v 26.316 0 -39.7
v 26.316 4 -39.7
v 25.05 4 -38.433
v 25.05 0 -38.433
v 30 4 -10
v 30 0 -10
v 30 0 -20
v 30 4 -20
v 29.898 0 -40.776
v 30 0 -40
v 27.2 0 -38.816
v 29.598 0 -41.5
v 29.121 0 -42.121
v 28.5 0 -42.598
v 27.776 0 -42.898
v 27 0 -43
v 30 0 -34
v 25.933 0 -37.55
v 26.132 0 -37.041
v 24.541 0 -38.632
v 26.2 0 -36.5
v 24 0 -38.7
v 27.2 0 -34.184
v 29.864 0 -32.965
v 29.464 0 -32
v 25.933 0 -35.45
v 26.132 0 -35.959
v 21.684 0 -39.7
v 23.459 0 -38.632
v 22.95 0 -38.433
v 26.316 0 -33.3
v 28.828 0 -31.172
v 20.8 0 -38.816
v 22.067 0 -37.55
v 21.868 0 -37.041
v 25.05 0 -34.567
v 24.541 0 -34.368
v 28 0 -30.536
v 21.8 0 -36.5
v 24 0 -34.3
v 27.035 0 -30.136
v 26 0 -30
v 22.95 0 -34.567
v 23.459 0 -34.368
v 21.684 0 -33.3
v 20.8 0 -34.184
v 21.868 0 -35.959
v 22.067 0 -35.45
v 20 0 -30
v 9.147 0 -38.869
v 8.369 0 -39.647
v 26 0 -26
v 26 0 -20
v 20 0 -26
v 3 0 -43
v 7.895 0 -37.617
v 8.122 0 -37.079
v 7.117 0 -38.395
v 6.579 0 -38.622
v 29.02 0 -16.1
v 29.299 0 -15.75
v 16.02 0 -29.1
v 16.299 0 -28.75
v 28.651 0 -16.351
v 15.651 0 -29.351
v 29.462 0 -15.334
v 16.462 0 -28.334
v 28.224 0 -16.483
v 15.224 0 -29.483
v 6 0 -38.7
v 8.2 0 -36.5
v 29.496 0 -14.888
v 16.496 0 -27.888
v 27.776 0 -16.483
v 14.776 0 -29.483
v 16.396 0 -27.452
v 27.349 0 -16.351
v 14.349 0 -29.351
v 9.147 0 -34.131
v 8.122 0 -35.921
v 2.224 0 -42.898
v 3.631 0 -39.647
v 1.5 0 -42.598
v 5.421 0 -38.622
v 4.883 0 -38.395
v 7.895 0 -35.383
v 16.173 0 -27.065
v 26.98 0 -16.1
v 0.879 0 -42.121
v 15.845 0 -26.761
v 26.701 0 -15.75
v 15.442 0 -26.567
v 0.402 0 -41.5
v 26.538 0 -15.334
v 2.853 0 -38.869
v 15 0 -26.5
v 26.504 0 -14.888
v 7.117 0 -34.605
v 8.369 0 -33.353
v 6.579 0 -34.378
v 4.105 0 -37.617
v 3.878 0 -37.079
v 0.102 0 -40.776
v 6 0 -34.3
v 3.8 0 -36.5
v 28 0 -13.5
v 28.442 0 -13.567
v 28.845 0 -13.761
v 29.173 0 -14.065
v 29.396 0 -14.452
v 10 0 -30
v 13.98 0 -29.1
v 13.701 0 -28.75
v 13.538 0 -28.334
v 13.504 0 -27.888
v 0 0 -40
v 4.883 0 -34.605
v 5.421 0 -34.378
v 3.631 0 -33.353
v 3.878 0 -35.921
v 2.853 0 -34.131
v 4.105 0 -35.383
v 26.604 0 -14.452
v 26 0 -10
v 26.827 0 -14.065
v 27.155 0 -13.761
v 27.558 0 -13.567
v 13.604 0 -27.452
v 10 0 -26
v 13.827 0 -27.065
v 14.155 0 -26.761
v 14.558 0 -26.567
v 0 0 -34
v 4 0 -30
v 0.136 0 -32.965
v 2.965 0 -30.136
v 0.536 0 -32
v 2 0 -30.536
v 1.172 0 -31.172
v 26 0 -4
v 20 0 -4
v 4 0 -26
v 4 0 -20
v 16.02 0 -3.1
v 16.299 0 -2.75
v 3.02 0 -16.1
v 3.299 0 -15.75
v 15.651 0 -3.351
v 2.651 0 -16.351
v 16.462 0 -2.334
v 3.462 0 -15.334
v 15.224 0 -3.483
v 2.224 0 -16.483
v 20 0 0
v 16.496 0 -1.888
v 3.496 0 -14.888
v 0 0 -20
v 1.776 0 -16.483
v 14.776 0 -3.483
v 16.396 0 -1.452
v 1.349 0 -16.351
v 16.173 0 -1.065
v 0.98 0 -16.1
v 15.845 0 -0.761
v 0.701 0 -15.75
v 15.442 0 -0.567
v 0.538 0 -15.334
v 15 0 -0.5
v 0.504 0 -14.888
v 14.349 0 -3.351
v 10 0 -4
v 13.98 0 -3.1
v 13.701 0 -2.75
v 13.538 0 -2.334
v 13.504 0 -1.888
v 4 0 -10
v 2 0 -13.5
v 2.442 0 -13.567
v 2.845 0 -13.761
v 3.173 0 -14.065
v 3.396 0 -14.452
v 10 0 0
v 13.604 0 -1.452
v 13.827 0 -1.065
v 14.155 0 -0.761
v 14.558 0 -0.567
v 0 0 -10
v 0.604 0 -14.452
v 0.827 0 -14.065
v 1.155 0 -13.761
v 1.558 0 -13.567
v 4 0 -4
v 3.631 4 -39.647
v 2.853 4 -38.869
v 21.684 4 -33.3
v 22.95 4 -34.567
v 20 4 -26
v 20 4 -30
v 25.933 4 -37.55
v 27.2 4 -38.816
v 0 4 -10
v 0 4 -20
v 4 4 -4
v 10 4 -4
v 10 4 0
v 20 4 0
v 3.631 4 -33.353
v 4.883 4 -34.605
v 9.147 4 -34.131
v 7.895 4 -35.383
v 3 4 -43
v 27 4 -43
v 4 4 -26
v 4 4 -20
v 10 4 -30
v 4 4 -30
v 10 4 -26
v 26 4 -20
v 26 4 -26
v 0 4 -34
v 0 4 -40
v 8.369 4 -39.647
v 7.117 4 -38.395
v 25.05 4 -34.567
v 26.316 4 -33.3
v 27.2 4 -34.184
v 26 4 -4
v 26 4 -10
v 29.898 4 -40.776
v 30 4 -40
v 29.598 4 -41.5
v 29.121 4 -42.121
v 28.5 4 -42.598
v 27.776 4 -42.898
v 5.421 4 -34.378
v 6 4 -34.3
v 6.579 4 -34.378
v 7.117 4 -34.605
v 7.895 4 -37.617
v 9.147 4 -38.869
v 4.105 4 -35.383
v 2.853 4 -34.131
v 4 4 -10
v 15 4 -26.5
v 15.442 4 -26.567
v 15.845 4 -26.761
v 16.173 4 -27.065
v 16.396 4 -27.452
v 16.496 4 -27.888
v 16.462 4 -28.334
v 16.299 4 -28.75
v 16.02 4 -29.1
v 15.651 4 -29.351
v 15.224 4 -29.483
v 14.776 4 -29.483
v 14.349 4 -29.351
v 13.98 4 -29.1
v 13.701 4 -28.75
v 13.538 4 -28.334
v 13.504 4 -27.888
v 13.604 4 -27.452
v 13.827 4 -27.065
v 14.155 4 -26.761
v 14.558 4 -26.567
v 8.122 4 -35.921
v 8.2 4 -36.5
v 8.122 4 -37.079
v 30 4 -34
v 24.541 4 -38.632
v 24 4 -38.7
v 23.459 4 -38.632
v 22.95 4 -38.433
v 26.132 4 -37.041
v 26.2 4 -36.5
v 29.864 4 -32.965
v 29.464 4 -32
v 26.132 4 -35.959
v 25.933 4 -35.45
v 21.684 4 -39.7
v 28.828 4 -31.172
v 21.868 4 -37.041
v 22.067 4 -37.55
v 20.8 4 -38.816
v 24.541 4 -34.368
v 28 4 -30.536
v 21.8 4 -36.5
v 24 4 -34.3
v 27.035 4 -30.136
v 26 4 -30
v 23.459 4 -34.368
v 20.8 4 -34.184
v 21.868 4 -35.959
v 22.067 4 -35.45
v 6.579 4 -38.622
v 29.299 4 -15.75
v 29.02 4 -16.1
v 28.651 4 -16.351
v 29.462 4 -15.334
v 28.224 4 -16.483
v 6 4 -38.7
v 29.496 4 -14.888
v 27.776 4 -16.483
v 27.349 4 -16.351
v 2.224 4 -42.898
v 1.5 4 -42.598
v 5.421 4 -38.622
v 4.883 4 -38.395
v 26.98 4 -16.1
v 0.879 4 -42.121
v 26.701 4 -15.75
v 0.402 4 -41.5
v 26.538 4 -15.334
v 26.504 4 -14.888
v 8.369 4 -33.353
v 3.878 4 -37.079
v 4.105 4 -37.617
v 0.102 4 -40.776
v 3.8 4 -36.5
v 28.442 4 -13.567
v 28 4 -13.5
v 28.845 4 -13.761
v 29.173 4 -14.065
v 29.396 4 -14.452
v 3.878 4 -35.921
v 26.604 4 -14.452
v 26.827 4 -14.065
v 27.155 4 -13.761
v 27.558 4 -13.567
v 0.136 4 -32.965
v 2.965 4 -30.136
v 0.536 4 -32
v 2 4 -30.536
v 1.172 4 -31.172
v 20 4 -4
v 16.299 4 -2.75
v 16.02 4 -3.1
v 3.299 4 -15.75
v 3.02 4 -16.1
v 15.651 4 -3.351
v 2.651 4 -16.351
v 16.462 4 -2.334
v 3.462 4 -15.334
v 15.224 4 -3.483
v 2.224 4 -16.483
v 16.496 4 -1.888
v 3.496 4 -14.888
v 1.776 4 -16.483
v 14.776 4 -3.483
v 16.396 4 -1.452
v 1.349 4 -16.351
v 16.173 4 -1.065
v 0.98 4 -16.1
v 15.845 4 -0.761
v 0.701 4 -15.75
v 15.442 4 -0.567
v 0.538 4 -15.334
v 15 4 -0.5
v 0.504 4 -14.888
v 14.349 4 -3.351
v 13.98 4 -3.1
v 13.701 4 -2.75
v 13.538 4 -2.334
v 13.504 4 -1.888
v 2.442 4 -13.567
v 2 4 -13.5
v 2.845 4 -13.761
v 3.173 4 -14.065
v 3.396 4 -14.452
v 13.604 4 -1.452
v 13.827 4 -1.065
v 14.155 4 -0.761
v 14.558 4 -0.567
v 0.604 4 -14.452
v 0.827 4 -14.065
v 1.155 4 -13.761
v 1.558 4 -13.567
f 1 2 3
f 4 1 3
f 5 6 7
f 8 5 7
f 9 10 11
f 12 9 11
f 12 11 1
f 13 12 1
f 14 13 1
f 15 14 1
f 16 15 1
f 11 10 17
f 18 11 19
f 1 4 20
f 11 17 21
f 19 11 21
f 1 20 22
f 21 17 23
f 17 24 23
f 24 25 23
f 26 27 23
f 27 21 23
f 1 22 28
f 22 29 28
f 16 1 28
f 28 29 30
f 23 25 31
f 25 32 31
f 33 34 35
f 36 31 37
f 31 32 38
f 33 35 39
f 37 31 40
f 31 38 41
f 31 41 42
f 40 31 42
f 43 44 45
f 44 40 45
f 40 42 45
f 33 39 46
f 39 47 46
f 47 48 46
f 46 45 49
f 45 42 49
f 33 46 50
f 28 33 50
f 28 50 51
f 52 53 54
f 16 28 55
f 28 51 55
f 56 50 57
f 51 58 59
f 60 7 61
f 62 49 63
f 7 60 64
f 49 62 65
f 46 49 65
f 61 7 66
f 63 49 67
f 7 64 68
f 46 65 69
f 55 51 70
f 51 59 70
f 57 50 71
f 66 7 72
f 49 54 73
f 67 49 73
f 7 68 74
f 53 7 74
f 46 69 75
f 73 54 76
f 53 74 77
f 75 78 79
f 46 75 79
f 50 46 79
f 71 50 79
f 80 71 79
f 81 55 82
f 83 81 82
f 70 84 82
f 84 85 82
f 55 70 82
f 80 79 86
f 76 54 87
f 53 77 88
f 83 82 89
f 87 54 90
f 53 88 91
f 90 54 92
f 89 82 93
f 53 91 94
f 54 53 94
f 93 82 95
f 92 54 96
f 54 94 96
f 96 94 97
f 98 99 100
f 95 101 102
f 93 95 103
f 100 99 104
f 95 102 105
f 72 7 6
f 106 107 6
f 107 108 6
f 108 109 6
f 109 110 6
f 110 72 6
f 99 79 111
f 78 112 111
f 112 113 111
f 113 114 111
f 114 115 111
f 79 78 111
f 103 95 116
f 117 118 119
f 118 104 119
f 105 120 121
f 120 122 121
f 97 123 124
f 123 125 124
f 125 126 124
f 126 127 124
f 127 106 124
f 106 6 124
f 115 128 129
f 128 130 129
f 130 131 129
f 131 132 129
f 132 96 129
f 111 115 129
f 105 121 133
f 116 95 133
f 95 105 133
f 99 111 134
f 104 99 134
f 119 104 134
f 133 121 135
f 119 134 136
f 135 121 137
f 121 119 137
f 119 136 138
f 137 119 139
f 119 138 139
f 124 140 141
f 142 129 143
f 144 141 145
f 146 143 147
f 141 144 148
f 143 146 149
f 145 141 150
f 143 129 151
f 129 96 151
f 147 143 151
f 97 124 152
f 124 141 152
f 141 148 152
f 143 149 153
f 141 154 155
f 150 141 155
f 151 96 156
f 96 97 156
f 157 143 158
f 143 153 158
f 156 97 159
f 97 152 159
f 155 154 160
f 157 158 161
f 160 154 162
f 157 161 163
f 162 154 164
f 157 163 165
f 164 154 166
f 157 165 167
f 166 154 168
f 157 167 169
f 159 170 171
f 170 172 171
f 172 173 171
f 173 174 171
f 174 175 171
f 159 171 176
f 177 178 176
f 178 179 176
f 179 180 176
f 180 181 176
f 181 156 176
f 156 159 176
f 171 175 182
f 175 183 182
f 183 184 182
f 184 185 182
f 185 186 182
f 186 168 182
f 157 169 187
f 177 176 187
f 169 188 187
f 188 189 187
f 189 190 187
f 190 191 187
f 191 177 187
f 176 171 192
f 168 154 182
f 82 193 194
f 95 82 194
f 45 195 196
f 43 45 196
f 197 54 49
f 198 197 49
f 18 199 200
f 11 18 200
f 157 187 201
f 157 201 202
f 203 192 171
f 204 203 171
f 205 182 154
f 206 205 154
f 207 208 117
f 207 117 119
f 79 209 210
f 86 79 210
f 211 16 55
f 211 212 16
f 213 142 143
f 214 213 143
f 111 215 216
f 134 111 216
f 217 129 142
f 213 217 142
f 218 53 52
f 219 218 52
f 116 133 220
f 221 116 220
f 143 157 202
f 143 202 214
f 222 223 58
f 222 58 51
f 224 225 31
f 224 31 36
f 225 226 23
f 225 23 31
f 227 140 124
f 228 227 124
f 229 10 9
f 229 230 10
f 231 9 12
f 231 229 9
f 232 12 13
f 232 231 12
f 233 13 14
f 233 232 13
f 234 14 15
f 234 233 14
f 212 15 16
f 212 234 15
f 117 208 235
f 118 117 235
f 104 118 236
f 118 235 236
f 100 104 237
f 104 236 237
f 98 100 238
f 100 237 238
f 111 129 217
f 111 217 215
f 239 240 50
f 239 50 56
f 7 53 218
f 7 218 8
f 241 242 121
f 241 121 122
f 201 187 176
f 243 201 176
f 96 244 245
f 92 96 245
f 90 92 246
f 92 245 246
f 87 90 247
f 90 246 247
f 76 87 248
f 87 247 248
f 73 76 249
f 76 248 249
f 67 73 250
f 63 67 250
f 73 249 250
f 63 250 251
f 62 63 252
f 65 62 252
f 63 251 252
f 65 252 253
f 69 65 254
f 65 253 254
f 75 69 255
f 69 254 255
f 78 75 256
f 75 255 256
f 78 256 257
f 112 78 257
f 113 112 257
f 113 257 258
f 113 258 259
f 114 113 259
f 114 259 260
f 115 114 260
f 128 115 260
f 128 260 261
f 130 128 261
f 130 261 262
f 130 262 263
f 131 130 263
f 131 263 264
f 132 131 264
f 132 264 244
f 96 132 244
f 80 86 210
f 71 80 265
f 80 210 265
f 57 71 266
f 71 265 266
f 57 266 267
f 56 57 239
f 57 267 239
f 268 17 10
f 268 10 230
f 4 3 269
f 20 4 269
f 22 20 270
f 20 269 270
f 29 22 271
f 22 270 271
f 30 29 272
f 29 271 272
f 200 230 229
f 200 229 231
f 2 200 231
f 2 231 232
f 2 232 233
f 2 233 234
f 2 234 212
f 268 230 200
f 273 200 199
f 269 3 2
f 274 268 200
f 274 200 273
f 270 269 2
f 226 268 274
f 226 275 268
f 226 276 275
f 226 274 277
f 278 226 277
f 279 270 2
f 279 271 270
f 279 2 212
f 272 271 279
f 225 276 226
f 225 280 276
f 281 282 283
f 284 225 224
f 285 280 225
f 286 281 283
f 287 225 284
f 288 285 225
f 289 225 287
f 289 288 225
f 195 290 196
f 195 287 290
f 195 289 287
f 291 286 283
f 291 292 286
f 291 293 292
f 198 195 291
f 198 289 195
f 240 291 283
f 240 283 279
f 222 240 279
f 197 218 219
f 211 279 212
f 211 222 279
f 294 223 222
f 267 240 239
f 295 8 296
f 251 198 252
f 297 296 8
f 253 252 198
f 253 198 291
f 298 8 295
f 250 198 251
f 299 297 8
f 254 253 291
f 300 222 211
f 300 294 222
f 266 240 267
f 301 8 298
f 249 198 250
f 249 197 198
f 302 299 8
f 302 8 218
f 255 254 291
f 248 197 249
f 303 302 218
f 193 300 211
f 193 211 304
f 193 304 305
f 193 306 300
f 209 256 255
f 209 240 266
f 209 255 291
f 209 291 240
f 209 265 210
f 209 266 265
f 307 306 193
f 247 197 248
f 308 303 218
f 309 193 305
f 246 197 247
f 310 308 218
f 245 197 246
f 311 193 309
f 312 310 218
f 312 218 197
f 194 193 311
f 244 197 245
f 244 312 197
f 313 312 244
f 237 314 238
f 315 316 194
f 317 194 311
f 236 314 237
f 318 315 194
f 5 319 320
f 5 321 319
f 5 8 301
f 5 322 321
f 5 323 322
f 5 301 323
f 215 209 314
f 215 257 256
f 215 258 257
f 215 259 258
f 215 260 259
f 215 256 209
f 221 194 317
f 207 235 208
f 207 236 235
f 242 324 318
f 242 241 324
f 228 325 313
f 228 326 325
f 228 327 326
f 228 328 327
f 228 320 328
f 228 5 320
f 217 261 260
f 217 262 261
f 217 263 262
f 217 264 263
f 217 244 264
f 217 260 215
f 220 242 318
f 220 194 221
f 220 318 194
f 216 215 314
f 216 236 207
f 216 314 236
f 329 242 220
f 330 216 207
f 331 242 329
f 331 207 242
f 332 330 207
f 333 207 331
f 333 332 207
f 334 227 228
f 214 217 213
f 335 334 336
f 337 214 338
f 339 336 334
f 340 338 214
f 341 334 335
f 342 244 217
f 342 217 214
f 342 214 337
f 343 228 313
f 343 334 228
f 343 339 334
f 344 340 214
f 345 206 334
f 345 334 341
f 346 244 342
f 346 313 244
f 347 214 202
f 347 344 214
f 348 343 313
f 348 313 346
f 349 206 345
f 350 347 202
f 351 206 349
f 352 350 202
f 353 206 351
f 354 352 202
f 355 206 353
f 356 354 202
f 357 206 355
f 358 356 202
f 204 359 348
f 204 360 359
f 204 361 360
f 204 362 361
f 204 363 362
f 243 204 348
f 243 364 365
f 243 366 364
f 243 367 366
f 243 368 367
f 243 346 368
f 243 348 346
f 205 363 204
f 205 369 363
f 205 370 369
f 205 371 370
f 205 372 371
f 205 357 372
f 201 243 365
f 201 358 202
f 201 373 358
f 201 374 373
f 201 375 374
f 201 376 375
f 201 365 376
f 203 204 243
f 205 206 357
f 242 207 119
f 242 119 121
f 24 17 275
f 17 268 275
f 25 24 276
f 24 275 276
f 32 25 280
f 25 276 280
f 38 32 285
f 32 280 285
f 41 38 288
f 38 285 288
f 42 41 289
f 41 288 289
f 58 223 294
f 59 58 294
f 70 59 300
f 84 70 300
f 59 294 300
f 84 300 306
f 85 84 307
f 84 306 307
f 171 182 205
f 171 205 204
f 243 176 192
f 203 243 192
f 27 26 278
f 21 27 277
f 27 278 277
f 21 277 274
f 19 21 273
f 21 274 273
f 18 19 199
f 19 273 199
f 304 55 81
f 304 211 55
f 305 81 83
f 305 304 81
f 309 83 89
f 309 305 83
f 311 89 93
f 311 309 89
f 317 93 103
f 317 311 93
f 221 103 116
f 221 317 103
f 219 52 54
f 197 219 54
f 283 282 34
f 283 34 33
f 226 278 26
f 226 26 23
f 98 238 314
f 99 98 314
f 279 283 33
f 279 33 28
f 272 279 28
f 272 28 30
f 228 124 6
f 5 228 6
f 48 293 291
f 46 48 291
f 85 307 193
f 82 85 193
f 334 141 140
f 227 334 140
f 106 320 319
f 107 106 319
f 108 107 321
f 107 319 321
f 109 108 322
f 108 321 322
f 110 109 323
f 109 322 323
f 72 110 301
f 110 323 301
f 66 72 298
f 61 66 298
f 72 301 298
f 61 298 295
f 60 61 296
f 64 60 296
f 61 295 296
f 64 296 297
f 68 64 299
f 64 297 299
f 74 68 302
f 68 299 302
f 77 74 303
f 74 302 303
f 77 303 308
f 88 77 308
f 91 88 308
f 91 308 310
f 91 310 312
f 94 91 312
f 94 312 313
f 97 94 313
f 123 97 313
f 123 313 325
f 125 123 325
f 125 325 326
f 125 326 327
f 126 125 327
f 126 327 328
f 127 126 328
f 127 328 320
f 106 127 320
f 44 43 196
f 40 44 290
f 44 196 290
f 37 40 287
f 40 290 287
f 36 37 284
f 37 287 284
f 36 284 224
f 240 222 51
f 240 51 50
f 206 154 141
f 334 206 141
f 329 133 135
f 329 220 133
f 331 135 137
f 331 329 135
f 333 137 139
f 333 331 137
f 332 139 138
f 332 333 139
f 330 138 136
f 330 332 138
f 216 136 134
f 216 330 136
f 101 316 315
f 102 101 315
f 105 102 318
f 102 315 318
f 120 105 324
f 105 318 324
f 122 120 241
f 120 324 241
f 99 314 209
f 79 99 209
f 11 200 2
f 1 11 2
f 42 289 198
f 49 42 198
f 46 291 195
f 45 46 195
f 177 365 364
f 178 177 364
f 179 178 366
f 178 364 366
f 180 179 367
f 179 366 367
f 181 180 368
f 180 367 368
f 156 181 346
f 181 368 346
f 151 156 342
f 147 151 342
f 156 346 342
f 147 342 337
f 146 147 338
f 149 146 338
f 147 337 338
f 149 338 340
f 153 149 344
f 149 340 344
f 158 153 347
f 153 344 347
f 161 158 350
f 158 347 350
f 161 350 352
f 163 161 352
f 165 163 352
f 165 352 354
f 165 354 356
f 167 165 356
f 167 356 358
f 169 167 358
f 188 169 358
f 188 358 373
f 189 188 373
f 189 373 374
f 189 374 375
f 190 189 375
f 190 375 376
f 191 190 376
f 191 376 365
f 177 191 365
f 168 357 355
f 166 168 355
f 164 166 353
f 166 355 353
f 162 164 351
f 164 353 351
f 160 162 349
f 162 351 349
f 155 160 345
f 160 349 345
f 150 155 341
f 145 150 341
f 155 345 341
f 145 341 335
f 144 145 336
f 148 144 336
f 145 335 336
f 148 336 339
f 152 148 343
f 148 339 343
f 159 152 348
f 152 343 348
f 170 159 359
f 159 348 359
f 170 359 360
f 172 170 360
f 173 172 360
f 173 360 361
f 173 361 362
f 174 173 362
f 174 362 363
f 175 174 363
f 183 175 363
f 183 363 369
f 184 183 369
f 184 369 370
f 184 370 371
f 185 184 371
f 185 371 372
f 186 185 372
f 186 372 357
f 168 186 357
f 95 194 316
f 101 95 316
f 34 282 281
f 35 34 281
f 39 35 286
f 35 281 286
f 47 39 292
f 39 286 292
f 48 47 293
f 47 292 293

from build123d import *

# Parameters (mm, degrees)
BOSS_EXTRUDE1_DEPTH = 4
SKETCH3_W           = 30
SKETCH3_H           = 4
BOSS_EXTRUDE2_DEPTH = 13
CUT_EXTRUDE2_DEPTH  = 10
FILLET1_R           = 3
FILLET2_R           = 4
SKETCH6_R           = 1.5
CUT_EXTRUDE3_DEPTH  = 10


with BuildPart() as part:
    # Sketch1 → Boss-Extrude1 (new body)
    with BuildSketch(Plane(origin=(0, 0, 0), x_dir=(1, 0, 0), z_dir=(0, 1, 0))):
        Polygon((10, 4), (10, 0), (20, 0), (20, 4), (26, 4), (26, 10), (30, 10), (30, 20), (26, 20), (26, 26), (20, 26), (20, 30), (10, 30), (10, 26), (4, 26), (4, 20), (0, 20), (0, 10), (4, 10), (4, 4), align=None)
    extrude(amount=BOSS_EXTRUDE1_DEPTH)

    # Sketch3 → Boss-Extrude2 (add)
    with BuildSketch(Plane(origin=(0, 0, -30), x_dir=(-1, 0, 0), z_dir=(0, 0, -1))):
        with Locations((-15, 2)):
            Rectangle(SKETCH3_W, SKETCH3_H)
    extrude(amount=BOSS_EXTRUDE2_DEPTH)

    # Sketch4 → Cut-Extrude2 (cut)
    with BuildSketch(Plane(origin=(0, 4, 0), x_dir=(1, 0, 0), z_dir=(0, 1, 0))):
        with BuildLine():
            Line((7.895145763, 37.617328303), (9.146625176, 38.868807717))
            Line((9.146625176, 38.868807717), (8.368807717, 39.646625176))
            Line((8.368807717, 39.646625176), (7.117328303, 38.395145763))
            ThreePointArc((7.117328303, 38.395145763), (6, 38.7), (4.882671697, 38.395145763))
            Line((4.882671697, 38.395145763), (3.631192283, 39.646625176))
            Line((3.631192283, 39.646625176), (2.853374824, 38.868807717))
            Line((2.853374824, 38.868807717), (4.104854237, 37.617328303))
            ThreePointArc((4.104854237, 37.617328303), (3.8, 36.5), (4.104854237, 35.382671697))
            Line((4.104854237, 35.382671697), (2.853374824, 34.131192283))
            Line((2.853374824, 34.131192283), (3.631192283, 33.353374824))
            Line((3.631192283, 33.353374824), (4.882671697, 34.604854237))
            ThreePointArc((4.882671697, 34.604854237), (6, 34.3), (7.117328303, 34.604854237))
            Line((7.117328303, 34.604854237), (8.368807717, 33.353374824))
            Line((8.368807717, 33.353374824), (9.146625176, 34.131192283))
            Line((9.146625176, 34.131192283), (7.895145763, 35.382671697))
            ThreePointArc((7.895145763, 35.382671697), (8.2, 36.5), (7.895145763, 37.617328303))
        make_face()
        with BuildLine():
            Line((22.950403103, 38.433480373), (21.684225292, 39.699658185))
            Line((21.684225292, 39.699658185), (20.800341815, 38.815774708))
            Line((20.800341815, 38.815774708), (22.066519627, 37.549596897))
            ThreePointArc((22.066519627, 37.549596897), (21.8, 36.5), (22.066519627, 35.450403103))
            Line((22.066519627, 35.450403103), (20.800341815, 34.184225292))
            Line((20.800341815, 34.184225292), (21.684225292, 33.300341815))
            Line((21.684225292, 33.300341815), (22.950403103, 34.566519627))
            ThreePointArc((22.950403103, 34.566519627), (24, 34.3), (25.049596897, 34.566519627))
            Line((25.049596897, 34.566519627), (26.315774708, 33.300341815))
            Line((26.315774708, 33.300341815), (27.199658185, 34.184225292))
            Line((27.199658185, 34.184225292), (25.933480373, 35.450403103))
            ThreePointArc((25.933480373, 35.450403103), (26.2, 36.5), (25.933480373, 37.549596897))
            Line((25.933480373, 37.549596897), (27.199658185, 38.815774708))
            Line((27.199658185, 38.815774708), (26.315774708, 39.699658185))
            Line((26.315774708, 39.699658185), (25.049596897, 38.433480373))
            ThreePointArc((25.049596897, 38.433480373), (24, 38.7), (22.950403103, 38.433480373))
        make_face()
    extrude(amount=-CUT_EXTRUDE2_DEPTH, mode=Mode.SUBTRACT)

    # Fillet1
    fillet1_edges = [part.edges().sort_by_distance(p)[0] for p in [
        (0, 2, -43),
        (30, 2, -43),
    ]]
    fillet(fillet1_edges, radius=FILLET1_R)

    # Fillet2
    fillet2_edges = [part.edges().sort_by_distance(p)[0] for p in [
        (0, 2, -30),
        (30, 2, -30),
    ]]
    fillet(fillet2_edges, radius=FILLET2_R)

    # Sketch6 → Cut-Extrude3 (cut)
    with BuildSketch(Plane(origin=(0, 4, 0), x_dir=(1, 0, 0), z_dir=(0, 1, 0))):
        with Locations((28, 15)):
            Circle(SKETCH6_R)
        with Locations((15, 2)):
            Circle(SKETCH6_R)
        with Locations((2, 15)):
            Circle(SKETCH6_R)
        with Locations((15, 28)):
            Circle(SKETCH6_R)
    extrude(amount=-CUT_EXTRUDE3_DEPTH, mode=Mode.SUBTRACT)


solid = part.part
